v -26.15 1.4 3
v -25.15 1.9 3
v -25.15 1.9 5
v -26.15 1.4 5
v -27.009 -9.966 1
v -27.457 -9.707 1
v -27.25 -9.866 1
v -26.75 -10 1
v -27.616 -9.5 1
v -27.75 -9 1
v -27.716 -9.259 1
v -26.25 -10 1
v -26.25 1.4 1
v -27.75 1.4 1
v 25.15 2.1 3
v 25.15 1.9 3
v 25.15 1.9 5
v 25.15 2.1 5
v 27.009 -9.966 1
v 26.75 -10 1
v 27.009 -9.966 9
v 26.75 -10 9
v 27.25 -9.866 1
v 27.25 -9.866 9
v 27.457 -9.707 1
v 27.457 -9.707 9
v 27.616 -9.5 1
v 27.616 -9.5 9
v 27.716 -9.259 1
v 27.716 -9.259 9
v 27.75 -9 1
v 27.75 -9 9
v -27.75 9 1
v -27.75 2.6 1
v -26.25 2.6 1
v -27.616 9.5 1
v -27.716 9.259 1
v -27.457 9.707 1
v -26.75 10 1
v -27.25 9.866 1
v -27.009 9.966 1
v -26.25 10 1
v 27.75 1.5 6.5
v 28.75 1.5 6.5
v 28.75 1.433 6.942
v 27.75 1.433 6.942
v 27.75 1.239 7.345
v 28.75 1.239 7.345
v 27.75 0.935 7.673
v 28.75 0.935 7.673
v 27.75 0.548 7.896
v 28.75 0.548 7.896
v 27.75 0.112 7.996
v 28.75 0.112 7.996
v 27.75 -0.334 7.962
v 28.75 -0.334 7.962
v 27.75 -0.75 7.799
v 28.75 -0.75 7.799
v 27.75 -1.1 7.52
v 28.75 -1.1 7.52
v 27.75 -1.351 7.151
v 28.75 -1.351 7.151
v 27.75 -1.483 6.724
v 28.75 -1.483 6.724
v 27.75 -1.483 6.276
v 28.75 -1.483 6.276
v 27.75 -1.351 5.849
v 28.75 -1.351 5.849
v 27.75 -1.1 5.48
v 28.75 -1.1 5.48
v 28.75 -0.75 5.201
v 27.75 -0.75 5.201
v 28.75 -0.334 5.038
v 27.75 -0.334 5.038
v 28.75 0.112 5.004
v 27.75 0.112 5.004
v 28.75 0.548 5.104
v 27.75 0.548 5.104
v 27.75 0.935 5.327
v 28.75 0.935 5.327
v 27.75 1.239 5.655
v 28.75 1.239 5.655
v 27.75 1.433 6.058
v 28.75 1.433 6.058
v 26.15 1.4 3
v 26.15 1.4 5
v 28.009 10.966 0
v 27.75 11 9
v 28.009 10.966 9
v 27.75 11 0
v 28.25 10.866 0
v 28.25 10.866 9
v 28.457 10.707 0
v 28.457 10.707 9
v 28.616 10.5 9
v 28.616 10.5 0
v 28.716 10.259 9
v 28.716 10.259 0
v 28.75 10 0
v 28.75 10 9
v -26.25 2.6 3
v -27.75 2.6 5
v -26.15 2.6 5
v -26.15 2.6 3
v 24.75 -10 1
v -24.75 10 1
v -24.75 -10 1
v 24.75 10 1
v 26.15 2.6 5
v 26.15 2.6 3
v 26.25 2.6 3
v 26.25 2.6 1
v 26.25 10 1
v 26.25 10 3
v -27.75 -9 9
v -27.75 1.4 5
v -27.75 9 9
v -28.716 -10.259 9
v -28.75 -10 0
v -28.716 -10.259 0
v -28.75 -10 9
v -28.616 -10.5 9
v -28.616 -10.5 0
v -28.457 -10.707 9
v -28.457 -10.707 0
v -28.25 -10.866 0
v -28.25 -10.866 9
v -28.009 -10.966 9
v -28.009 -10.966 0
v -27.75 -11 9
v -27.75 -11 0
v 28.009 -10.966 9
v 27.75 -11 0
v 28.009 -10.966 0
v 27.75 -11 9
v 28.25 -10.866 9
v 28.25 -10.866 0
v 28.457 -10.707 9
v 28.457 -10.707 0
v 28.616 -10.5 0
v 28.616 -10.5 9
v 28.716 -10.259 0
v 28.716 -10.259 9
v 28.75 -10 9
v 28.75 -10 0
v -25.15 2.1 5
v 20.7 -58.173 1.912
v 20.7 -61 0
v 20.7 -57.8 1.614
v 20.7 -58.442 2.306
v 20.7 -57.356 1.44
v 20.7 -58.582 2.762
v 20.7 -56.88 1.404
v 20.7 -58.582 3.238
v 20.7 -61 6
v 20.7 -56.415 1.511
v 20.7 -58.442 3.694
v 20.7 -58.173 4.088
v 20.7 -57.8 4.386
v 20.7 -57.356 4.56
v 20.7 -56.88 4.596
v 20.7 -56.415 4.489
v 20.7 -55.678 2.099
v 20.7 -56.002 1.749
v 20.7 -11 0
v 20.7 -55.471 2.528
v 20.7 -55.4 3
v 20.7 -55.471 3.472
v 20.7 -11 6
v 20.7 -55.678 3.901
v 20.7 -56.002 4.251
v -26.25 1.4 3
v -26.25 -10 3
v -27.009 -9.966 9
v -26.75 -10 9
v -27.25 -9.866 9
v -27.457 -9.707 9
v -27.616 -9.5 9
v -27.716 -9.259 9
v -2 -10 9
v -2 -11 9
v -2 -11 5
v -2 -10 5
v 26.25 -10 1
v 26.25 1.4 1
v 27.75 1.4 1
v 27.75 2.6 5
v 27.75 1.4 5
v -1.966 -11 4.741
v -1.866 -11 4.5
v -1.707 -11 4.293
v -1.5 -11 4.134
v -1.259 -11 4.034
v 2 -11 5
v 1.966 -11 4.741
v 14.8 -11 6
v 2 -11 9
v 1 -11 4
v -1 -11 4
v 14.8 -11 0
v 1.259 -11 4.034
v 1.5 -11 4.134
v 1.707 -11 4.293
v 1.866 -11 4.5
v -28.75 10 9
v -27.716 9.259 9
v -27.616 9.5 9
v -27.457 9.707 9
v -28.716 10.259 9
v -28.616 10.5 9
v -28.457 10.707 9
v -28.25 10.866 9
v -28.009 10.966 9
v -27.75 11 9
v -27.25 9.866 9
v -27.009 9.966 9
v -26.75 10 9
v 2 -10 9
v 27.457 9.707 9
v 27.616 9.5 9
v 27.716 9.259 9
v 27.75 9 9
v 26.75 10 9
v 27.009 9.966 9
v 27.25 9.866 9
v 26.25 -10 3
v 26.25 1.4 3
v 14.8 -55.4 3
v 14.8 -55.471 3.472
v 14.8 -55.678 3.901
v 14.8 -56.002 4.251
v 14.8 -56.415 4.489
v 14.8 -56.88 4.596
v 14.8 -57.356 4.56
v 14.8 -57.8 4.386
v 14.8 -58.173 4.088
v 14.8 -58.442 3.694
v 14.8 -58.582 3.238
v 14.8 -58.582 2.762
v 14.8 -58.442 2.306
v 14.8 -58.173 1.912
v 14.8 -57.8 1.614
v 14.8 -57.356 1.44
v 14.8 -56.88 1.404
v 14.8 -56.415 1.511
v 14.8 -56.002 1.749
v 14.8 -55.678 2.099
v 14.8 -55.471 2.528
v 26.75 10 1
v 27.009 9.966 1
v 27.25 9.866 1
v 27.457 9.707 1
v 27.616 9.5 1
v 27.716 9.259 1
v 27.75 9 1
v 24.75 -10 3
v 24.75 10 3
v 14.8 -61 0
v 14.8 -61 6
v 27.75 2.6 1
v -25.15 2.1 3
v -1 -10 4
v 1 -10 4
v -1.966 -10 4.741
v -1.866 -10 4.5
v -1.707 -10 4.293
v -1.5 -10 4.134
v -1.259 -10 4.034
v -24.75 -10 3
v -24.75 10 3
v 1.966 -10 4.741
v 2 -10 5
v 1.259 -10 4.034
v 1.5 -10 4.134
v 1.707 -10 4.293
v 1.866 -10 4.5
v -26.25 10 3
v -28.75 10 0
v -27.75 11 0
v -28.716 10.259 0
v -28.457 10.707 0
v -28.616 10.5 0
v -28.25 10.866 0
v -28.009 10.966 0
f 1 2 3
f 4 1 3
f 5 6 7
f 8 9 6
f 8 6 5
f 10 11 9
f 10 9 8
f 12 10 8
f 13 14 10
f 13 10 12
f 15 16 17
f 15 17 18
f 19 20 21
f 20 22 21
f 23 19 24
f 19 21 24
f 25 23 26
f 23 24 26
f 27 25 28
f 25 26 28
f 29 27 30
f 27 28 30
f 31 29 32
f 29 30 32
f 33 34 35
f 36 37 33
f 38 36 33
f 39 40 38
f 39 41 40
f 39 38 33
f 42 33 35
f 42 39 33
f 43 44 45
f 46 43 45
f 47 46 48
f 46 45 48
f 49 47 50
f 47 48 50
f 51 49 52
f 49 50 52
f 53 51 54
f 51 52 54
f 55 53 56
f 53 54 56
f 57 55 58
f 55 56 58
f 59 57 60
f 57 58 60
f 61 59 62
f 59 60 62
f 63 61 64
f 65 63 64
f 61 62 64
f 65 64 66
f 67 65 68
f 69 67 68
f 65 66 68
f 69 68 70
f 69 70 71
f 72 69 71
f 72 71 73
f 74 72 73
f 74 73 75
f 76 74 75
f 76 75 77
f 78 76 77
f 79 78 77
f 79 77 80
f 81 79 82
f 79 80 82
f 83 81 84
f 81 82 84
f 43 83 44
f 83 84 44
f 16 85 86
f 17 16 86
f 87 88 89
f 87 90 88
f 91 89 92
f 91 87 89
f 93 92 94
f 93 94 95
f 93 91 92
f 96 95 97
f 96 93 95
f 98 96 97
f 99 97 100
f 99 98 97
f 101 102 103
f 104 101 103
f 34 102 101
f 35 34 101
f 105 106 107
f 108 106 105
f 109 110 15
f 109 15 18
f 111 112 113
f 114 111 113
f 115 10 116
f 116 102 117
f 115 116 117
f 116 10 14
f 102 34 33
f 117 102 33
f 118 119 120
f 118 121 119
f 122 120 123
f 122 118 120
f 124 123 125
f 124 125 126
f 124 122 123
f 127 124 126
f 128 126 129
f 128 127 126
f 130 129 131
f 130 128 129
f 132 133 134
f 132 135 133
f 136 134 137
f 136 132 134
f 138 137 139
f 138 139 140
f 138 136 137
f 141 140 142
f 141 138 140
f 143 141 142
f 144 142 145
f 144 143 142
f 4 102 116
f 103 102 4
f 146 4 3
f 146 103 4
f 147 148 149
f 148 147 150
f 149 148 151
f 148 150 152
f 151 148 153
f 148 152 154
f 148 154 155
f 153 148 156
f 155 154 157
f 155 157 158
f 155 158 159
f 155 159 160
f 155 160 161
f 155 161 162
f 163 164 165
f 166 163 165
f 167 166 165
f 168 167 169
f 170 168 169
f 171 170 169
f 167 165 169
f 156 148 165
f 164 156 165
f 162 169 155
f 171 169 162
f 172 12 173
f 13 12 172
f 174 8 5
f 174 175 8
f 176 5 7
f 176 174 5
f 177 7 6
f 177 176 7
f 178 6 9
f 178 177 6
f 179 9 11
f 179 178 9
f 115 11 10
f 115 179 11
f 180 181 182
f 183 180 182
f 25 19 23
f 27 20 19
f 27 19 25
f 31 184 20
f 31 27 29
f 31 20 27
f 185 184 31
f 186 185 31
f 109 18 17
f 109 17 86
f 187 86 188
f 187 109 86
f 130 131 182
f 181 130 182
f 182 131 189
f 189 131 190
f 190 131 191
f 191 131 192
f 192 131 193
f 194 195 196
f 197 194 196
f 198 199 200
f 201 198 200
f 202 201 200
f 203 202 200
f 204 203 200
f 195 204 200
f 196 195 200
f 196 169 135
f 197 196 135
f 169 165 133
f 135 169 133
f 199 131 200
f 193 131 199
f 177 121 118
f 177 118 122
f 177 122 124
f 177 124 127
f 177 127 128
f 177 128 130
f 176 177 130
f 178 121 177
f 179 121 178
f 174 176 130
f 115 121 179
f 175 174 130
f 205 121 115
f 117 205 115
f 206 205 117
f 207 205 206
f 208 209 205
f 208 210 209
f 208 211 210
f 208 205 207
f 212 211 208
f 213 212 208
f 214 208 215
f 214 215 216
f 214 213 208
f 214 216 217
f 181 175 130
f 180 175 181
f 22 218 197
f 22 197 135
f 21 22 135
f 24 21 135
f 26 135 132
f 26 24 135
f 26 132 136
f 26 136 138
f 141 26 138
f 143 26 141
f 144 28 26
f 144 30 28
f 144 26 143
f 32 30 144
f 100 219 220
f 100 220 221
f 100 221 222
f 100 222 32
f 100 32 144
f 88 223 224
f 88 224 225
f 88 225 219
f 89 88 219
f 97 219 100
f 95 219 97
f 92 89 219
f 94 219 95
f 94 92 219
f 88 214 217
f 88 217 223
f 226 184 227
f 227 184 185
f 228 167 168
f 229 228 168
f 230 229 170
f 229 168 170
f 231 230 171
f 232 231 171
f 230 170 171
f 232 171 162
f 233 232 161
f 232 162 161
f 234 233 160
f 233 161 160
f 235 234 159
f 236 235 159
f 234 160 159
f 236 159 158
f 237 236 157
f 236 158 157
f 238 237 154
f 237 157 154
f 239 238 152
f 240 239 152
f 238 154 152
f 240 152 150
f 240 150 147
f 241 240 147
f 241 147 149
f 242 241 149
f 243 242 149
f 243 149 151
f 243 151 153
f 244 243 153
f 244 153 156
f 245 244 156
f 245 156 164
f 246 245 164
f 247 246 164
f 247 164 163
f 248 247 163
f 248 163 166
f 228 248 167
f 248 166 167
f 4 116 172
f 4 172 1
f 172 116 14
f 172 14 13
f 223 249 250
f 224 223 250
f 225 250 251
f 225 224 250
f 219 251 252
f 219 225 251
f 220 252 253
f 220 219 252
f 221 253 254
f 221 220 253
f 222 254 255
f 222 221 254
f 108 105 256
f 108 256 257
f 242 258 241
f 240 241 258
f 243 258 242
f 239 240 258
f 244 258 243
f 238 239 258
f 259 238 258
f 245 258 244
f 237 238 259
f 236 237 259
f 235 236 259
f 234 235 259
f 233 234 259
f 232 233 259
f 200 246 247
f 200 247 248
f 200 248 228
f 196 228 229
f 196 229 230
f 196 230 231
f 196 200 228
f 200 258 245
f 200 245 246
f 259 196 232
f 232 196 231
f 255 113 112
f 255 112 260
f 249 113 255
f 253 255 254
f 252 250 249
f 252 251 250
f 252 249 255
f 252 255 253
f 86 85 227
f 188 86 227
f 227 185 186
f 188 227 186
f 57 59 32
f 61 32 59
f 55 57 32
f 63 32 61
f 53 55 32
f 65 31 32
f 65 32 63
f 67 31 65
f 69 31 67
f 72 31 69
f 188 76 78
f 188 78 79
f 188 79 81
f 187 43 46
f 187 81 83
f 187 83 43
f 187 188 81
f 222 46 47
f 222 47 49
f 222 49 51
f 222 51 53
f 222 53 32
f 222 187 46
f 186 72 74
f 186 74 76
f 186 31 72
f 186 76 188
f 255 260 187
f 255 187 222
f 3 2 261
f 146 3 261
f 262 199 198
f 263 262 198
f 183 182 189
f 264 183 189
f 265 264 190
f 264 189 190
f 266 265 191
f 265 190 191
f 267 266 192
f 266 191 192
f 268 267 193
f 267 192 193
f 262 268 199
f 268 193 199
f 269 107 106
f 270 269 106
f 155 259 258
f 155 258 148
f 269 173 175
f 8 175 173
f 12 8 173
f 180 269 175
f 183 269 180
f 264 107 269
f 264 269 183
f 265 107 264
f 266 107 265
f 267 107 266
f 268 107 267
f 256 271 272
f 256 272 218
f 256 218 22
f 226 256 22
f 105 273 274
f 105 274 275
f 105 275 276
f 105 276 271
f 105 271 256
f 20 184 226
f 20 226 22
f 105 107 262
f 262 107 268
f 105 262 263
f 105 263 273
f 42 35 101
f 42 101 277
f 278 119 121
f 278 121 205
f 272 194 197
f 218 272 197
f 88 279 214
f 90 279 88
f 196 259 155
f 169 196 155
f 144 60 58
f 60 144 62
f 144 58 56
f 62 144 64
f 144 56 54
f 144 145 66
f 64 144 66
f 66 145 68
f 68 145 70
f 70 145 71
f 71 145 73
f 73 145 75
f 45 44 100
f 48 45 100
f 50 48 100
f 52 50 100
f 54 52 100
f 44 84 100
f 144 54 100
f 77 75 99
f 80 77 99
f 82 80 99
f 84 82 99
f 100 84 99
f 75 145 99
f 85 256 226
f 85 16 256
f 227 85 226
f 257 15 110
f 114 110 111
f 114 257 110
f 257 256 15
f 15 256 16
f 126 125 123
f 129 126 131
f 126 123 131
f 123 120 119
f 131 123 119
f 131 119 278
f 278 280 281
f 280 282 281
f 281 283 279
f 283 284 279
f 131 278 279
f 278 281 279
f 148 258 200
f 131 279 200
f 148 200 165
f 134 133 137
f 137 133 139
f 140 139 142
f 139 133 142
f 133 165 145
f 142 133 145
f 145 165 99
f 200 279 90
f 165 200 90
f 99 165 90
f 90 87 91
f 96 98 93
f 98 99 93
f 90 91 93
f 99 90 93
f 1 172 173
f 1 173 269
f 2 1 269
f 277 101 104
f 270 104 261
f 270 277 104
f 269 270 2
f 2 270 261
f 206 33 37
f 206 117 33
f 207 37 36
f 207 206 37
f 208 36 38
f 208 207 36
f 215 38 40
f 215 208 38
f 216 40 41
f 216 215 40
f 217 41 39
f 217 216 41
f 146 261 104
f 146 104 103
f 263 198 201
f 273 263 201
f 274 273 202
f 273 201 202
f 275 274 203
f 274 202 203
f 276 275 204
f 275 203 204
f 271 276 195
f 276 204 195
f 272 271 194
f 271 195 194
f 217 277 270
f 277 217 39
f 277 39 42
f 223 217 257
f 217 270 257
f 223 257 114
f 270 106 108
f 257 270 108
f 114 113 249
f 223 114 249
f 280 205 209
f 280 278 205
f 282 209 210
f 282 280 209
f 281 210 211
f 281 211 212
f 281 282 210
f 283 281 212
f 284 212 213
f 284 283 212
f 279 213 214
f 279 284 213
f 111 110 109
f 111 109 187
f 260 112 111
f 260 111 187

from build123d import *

# Parameters (mm, degrees)
F0_W        = 57.5
F0_H        = 22
F0_W_2      = 55.5
F0_H_2      = 20
F1_DEPTH    = 9
F2_W        = 57.5
F2_H        = 22
F3_DEPTH    = 1
F5_DEPTH    = 1
F6_W        = 5.9
F6_H        = 6
F7_DEPTH    = 50
F8_R        = 1.6
F9_DEPTH    = 5.9
F10_W       = 1.5
F10_H       = 20
F11_DEPTH   = 2
F12_R       = 1
F13_R       = 1
F14_R       = 1.5
F15_DEPTH   = 1
F16_W       = 2.6
F16_H       = 1.2
F17_DEPTH   = 4
F18_SIZE2   = 0.5
F18_SIZE    = 1
F18_2_SIZE2 = 0.5
F18_2_SIZE  = 1
F19_SIZE2   = 1
F19_SIZE    = 0.5


with BuildPart() as f1:
    # F0 (on Top) → F1 (new body)
    with BuildSketch(Plane.XY):
        Rectangle(F0_W, F0_H)
        Rectangle(F0_W_2, F0_H_2, mode=Mode.SUBTRACT)
    extrude(amount=F1_DEPTH)

    # F2 (on Top) → F3 (join)
    with BuildSketch(Plane.XY):
        Rectangle(F2_W, F2_H)
    extrude(amount=F3_DEPTH)

    # F4 (on face) → F5 (cut, through all)
    with BuildSketch(Plane.XZ.offset(11)):
        with BuildLine():
            Line((2, 9), (-2, 9))
            Line((-2, 9), (-2, 5))
            ThreePointArc((-2, 5), (-1.7071067812, 4.2928932188), (-1, 4))
            Line((-1, 4), (1, 4))
            ThreePointArc((1, 4), (1.7071067812, 4.2928932188), (2, 5))
            Line((2, 5), (2, 9))
        make_face()
    extrude(amount=-F5_DEPTH, mode=Mode.SUBTRACT)

    # F6 (on face) → F7 (join)
    with BuildSketch(Plane.XZ.offset(11)):
        with Locations((17.75, 3)):
            Rectangle(F6_W, F6_H)
    extrude(amount=F7_DEPTH)

    # F8 (on face) → F9 (cut, through all)
    with BuildSketch(Plane.YZ.offset(20.7)):
        with Locations((-57, 3)):
            Circle(F8_R)
    extrude(amount=-F9_DEPTH, mode=Mode.SUBTRACT)

    # F10 (on face) → F11 (join)
    with BuildSketch(Plane.XY.offset(1)):
        with Locations((-25.5, 0)):
            Rectangle(F10_W, F10_H)
        with Locations((25.5, 0)):
            Rectangle(F10_W, F10_H)
    extrude(amount=F11_DEPTH)

    # F12
    f12_edges = [f1.edges().sort_by_distance(p)[0] for p in [
        (-28.75, -11, 4.5),
        (28.75, -11, 4.5),
        (28.75, 11, 4.5),
        (-28.75, 11, 4.5),
    ]]
    fillet(f12_edges, radius=F12_R)

    # F13
    f13_edges = [f1.edges().sort_by_distance(p)[0] for p in [
        (-27.75, 10, 5),
        (27.75, 10, 5),
        (27.75, -10, 5),
        (-27.75, -10, 5),
    ]]
    fillet(f13_edges, radius=F13_R)

    # F14 (on face) → F15 (cut, through all)
    with BuildSketch(Plane.YZ.offset(28.75)):
        with Locations((0, 6.5)):
            Circle(F14_R)
    extrude(amount=-F15_DEPTH, mode=Mode.SUBTRACT)

    # F16 (on face) → F17 (join)
    with BuildSketch(Plane.XY.offset(1)):
        with Locations((26.45, 2)):
            Rectangle(F16_W, F16_H)
        with Locations((-26.45, 2)):
            Rectangle(F16_W, F16_H)
    extrude(amount=F17_DEPTH)

    # F18
    f18_edges = [f1.edges().sort_by_distance(p)[0] for p in [
        (-25.15, 2.6, 4),
    ]]
    f18_side = f1.faces().sort_by_distance((-26.65122, 2.6, 3.268293))[0]
    chamfer(f18_edges, length=F18_SIZE, length2=F18_SIZE2, reference=f18_side)

    # F18#2
    f18_2_edges = [f1.edges().sort_by_distance(p)[0] for p in [
        (-25.15, 1.4, 4),
    ]]
    f18_2_side = f1.faces().sort_by_distance((-26.65122, 1.4, 3.268293))[0]
    chamfer(f18_2_edges, length=F18_2_SIZE, length2=F18_2_SIZE2, reference=f18_2_side)

    # F19
    f19_edges = [f1.edges().sort_by_distance(p)[0] for p in [
        (25.15, 2.6, 4),
        (25.15, 1.4, 4),
    ]]
    f19_side = f1.faces().sort_by_distance((25.15, 2, 4))[0]
    chamfer(f19_edges, length=F19_SIZE, length2=F19_SIZE2, reference=f19_side)


solid = f1.part
